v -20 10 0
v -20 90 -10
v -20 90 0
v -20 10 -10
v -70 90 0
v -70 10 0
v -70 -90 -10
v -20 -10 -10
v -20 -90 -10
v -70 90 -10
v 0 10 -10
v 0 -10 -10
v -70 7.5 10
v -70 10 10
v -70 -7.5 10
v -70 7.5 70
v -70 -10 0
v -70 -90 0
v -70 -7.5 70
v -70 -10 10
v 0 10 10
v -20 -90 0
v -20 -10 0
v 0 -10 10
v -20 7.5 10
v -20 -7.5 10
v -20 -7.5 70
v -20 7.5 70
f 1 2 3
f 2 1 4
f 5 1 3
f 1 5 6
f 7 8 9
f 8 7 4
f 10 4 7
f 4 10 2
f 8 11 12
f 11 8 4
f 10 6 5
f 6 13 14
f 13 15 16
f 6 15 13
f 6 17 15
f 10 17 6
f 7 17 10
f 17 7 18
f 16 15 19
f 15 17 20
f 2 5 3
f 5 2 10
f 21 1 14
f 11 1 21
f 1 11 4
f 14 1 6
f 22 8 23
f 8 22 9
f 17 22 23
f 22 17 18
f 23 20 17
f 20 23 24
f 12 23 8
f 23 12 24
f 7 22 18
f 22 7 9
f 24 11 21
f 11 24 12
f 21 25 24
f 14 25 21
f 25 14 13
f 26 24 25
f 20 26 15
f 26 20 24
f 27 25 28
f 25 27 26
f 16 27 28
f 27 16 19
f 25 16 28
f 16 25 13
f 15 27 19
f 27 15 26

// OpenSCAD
module avion_arriere()
{
    aaq_lg = 70;
    aaq_pf = 20;
    aaq_ht = 20;
    
    translate([-aaq_lg,-aaq_pf/2,-aaq_ht/2])
    avion_arriere_queue(aaq_lg, aaq_pf, aaq_ht);
  
    aad_lg = 50;
    aad_pf = 15;
    aad_ht = 60;
    
    translate([-aaq_lg,0,aaq_ht/2])
    avion_arriere_derive(aad_lg, aad_pf, aad_ht);
  
    aas_lg = 50;
    aas_pf = 80;
    aas_ht = 10;
    
    translate([-aaq_lg,0,0])
    {
        translate([0,aaq_pf/2,0])
        avion_arriere_stabilisateur(aas_lg, aas_pf, aas_ht);
        
        translate([0,-aaq_pf/2,0])
        mirror([0,1,0])
        avion_arriere_stabilisateur(aas_lg, aas_pf, aas_ht);
    }
}

module avion_arriere_queue(lg, pf, ht)
{
    cube([lg, pf, ht]);
}

module avion_arriere_derive(lg, pf, ht)
{
    translate([0, -pf/2, 0])
    cube([lg, pf, ht]);
}

module avion_arriere_stabilisateur(lg, pf, ht)
{
    translate([0,0,-ht])
    cube([lg, pf, ht]);
}

avion_arriere();
